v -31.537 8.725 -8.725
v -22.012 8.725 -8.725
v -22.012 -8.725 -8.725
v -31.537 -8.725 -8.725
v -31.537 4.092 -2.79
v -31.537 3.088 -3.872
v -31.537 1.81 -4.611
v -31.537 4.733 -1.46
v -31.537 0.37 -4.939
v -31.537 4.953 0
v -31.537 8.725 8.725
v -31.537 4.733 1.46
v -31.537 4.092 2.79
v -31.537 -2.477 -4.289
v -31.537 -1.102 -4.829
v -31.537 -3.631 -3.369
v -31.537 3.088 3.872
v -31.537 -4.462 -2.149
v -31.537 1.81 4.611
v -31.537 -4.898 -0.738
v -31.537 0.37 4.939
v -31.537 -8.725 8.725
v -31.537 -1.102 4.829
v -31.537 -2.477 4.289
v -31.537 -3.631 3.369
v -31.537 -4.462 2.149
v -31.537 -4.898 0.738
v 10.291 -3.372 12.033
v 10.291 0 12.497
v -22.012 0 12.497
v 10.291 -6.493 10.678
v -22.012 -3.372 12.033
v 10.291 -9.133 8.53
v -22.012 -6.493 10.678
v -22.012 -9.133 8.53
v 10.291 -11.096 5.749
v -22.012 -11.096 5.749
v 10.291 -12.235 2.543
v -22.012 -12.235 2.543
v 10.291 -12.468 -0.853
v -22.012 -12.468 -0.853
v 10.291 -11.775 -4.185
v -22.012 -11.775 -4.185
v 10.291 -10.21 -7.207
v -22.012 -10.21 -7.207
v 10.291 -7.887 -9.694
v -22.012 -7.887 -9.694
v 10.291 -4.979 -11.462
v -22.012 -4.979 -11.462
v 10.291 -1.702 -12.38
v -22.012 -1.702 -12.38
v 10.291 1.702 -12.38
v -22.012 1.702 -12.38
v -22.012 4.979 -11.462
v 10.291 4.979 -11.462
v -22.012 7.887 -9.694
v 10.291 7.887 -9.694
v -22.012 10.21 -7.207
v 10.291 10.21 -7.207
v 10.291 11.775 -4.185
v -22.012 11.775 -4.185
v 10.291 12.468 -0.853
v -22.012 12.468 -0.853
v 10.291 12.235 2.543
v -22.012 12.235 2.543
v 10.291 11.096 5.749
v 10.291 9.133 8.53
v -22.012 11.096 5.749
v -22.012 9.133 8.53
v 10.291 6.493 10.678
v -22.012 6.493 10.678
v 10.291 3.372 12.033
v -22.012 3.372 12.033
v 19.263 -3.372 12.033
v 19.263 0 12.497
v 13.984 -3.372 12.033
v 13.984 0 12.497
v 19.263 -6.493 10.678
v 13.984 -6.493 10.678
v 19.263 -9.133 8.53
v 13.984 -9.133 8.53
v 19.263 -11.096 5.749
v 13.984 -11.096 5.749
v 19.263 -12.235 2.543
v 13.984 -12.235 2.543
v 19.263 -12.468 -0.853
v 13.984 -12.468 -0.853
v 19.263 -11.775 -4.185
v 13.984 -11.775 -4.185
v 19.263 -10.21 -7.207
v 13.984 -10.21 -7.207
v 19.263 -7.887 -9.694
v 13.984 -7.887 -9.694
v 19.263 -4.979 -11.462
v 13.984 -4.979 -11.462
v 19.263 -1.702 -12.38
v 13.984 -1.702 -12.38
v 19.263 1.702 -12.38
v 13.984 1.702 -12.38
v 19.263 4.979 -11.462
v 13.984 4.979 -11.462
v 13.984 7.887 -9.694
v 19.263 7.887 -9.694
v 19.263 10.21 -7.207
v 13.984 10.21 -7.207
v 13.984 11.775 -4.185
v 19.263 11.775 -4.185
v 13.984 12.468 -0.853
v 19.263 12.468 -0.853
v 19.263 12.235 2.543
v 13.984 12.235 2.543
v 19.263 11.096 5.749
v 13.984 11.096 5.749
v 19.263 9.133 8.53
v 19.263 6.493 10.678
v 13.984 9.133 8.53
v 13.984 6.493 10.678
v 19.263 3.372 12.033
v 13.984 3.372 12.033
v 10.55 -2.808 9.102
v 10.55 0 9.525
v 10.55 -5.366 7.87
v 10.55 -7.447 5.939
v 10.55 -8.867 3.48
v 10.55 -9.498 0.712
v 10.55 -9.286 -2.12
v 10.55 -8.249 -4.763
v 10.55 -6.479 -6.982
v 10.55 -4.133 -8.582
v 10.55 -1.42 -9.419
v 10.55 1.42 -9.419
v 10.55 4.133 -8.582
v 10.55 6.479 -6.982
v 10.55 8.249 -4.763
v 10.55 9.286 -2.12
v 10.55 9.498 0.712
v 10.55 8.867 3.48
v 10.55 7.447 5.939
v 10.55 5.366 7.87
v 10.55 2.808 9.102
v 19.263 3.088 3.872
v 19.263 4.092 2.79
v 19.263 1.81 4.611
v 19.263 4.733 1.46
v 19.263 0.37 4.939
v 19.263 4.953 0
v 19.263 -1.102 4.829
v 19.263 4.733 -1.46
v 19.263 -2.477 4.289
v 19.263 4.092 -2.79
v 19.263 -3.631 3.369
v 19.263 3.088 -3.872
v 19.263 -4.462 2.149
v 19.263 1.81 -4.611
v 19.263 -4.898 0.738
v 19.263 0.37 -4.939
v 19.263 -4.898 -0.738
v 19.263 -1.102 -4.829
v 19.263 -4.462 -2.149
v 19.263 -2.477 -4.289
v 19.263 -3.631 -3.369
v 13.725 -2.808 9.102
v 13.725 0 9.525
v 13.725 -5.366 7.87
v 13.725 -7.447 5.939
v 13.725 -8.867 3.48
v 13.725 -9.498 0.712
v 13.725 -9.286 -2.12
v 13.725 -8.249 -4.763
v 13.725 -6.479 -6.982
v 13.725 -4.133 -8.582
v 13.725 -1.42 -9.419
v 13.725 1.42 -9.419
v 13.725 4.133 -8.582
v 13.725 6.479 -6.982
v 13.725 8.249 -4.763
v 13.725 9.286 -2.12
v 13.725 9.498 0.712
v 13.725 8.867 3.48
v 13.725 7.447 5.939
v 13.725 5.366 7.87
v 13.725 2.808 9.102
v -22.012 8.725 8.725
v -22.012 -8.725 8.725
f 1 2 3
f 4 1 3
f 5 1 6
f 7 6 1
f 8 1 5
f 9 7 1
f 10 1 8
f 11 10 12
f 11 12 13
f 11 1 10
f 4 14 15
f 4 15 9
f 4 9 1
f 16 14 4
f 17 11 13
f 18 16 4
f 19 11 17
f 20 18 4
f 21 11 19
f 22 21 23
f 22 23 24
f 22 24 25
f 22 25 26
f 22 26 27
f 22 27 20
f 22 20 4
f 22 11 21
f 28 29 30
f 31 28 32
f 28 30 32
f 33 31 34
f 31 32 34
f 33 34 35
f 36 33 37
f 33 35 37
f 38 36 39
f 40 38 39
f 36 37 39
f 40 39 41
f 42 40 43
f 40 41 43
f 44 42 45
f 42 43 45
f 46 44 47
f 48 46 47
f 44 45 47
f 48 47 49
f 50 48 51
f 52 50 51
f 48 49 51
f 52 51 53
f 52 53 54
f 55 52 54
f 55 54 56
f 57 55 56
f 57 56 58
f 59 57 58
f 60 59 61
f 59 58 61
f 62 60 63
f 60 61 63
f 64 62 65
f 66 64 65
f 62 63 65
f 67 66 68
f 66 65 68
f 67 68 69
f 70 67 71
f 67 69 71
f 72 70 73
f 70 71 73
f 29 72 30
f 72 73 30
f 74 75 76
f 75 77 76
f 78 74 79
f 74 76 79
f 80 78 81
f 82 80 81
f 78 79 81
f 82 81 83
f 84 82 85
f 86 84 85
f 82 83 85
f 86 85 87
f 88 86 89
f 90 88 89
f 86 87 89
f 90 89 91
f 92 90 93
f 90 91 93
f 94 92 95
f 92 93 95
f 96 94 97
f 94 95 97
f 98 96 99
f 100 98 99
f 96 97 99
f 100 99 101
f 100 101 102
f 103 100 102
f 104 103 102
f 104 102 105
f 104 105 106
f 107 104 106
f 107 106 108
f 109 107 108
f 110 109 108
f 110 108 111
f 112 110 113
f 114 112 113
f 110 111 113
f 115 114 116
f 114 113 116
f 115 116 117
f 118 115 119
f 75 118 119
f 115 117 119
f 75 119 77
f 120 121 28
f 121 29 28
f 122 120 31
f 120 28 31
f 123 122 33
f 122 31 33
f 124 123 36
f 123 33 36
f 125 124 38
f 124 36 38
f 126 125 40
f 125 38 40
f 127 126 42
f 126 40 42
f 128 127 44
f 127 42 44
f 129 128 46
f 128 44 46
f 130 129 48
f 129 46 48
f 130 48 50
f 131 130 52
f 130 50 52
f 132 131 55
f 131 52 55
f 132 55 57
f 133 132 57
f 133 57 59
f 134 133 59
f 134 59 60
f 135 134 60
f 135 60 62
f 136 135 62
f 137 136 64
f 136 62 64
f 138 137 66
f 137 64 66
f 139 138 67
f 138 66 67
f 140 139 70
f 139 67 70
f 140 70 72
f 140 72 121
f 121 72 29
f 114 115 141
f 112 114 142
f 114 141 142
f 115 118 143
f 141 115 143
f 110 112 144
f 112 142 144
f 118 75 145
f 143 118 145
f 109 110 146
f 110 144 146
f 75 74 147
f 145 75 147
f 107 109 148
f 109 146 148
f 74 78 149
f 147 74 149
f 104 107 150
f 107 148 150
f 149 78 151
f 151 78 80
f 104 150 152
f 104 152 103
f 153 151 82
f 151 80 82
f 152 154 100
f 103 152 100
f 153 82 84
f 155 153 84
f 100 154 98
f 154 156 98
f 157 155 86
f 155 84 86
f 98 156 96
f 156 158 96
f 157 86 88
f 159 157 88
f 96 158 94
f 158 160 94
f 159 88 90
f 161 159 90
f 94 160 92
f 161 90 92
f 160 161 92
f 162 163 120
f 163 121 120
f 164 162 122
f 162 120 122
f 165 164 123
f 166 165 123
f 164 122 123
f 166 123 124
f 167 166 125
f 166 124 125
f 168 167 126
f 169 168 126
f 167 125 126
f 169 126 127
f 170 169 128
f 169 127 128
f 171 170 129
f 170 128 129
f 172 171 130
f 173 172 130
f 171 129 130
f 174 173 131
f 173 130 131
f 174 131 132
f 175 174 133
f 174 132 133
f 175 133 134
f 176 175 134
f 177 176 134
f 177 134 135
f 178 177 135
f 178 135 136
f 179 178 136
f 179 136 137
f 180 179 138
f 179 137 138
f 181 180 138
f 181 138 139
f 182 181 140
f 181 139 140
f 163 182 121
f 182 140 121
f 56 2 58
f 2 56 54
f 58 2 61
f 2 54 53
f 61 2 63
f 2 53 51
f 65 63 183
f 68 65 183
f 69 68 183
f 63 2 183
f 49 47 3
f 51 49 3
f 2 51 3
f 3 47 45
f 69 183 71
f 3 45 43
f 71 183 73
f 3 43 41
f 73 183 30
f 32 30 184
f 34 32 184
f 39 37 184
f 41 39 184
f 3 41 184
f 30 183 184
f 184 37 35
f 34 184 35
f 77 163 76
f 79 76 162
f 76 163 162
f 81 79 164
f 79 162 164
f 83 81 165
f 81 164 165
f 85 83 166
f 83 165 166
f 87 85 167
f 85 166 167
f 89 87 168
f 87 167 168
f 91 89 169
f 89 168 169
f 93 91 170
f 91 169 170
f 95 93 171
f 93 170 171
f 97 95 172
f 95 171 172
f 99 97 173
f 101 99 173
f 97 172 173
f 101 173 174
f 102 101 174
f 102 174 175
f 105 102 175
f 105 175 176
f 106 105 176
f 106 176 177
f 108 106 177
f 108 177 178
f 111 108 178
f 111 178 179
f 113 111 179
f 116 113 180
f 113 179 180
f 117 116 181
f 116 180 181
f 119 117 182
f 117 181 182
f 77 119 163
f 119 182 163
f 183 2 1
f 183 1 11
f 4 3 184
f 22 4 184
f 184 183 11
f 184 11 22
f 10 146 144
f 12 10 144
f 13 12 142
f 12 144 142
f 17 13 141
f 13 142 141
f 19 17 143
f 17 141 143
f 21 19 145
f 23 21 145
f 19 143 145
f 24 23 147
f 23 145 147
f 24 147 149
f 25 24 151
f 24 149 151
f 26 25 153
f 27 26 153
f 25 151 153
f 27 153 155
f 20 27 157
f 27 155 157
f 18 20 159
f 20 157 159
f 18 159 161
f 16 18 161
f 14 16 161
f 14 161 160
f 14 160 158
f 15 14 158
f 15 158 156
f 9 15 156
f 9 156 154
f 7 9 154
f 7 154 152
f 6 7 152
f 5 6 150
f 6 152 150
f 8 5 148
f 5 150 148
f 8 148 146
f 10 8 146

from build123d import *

# Parameters (mm, degrees)
F2_W     = 17.4498
F2_H     = 17.4498
F3_DEPTH = 9.525
F4_R     = 4.953
F5_DEPTH = 50.8


# Not quite as in the source:
# - a feature names something its author has since deleted; it is built from what else it names


with BuildPart() as f1:
    # F0 (on Front) → F1 (revolve)
    with BuildSketch(Plane.XZ):
        Polygon((-22.0124394905, 12.4968), (-22.0124394905, 7.5298989686), (-22.0124394905, 0), (19.2625605095, 0), (19.2625605095, 3.7935770415), (19.2625605095, 12.4968), (13.9844405095, 12.4968), (13.7253605095, 9.525), (10.5503605095, 9.525), (10.2912805095, 12.4968), align=None)
    revolve(axis=Axis((-1.3749394905, 0, 0), (1, 0, 0)))

    # F2 (on face) → F3 (join)
    with BuildSketch(Plane(origin=(-22.0124394905, 0, 0), x_dir=(0, -1, 0), z_dir=(-1, 0, 0))):
        Rectangle(F2_W, F2_H)
    extrude(amount=F3_DEPTH)

    # F4 (on face) → F5 (cut)
    with BuildSketch(Plane.YZ.offset(19.2625605095)):
        Circle(F4_R)
    extrude(amount=-F5_DEPTH, mode=Mode.SUBTRACT)


solid = f1.part
